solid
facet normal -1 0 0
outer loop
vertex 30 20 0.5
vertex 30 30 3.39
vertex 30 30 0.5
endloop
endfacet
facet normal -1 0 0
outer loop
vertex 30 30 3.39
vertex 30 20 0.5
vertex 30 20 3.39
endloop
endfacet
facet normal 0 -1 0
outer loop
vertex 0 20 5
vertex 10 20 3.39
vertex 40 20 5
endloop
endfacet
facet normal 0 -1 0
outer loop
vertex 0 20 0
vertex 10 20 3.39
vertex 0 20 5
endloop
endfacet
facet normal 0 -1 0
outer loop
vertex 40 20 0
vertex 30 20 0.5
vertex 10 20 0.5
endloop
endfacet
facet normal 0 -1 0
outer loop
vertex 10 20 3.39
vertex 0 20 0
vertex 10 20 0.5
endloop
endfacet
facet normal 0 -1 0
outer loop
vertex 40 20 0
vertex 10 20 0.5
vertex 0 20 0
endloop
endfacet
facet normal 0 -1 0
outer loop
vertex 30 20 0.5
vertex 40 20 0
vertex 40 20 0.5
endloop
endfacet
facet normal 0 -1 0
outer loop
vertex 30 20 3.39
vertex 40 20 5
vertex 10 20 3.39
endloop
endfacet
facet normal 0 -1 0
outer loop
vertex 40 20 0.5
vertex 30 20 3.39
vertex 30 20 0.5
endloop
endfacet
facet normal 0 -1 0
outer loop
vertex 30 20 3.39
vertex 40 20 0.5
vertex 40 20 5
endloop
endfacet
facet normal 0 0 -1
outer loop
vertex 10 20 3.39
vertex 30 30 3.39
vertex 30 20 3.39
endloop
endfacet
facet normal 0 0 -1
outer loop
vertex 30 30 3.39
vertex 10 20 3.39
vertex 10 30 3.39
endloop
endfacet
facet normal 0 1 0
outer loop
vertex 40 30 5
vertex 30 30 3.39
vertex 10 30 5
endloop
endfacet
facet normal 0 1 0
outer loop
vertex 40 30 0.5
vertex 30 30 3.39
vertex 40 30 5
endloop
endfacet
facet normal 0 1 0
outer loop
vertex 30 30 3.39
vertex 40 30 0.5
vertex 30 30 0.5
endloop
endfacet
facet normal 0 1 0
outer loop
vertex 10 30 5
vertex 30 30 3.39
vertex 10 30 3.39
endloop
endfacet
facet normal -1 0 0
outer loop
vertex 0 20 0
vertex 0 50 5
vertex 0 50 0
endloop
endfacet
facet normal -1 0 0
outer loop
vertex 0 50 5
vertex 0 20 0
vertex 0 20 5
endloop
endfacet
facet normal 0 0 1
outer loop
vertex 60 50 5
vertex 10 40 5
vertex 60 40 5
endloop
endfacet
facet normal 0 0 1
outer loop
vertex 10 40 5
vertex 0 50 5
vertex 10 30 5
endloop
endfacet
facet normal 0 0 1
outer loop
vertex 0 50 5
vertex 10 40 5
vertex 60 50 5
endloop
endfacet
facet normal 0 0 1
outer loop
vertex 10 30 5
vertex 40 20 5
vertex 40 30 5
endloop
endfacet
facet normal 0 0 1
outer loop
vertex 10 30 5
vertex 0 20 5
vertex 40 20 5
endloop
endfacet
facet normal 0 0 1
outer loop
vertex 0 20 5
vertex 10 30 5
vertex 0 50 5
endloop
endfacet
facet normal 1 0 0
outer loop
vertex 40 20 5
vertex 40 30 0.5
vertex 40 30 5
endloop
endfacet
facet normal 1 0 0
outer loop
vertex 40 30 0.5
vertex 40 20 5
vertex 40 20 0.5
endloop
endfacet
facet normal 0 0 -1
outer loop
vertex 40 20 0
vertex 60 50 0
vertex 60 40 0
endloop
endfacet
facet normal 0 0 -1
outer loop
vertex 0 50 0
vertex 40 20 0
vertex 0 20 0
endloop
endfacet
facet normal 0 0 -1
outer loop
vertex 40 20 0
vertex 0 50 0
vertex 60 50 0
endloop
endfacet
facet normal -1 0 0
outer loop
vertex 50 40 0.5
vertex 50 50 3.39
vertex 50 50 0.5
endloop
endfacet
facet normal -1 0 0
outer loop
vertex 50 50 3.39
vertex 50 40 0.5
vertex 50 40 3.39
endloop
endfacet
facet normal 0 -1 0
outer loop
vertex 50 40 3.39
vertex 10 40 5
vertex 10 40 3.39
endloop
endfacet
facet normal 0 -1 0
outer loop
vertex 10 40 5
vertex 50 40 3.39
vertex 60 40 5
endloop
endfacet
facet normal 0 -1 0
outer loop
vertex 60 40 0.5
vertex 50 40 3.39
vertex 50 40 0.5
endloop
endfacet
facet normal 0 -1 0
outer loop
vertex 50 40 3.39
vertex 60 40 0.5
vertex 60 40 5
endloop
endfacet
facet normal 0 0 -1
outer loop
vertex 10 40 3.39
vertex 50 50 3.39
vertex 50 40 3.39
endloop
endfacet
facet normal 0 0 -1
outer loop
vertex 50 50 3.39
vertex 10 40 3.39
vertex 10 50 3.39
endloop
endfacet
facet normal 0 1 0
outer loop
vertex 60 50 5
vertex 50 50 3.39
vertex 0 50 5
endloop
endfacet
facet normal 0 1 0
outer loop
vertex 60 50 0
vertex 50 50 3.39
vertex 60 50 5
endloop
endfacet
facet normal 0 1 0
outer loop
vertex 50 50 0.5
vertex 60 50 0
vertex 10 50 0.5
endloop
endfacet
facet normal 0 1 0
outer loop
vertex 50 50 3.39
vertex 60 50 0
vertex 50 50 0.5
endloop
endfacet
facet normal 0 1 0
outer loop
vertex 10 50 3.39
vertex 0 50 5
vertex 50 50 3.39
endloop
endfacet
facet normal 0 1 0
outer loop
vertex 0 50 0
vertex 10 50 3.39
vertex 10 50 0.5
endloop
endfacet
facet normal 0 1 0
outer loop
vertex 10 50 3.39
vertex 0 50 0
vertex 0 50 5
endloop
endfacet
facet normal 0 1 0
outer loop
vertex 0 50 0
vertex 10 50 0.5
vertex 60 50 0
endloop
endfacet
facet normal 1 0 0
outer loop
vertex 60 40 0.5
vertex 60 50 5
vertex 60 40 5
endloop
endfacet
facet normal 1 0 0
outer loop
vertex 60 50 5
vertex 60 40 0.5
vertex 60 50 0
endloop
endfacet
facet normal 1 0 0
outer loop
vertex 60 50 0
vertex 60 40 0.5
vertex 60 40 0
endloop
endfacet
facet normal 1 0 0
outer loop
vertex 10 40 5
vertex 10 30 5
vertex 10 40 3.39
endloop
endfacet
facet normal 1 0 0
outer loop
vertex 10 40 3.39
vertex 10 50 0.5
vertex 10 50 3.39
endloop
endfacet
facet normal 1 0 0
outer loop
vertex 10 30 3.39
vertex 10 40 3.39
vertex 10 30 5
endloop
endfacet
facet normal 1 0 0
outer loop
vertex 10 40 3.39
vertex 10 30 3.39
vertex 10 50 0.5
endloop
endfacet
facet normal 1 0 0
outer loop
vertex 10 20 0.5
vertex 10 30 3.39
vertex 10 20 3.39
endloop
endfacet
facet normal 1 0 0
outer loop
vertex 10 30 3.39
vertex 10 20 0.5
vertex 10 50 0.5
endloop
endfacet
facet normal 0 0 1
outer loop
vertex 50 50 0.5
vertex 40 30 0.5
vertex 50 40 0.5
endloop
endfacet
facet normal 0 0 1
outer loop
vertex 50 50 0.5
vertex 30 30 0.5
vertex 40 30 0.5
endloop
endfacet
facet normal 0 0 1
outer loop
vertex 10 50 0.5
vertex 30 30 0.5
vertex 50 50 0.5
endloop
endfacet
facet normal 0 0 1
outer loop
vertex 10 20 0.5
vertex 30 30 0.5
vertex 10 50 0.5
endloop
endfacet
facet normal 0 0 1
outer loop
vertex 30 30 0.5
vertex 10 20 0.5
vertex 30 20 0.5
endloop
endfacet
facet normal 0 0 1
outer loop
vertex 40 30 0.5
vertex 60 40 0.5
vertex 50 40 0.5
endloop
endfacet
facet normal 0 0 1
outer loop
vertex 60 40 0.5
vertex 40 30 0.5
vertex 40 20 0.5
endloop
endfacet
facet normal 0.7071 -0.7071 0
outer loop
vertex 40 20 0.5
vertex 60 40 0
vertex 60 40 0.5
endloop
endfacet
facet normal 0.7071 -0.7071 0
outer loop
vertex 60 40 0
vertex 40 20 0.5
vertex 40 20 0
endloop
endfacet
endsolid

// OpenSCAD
$fn=100;

bridge_length = 40;
bridge_angle = 0;
bridge_width = 6;

bridge_recovery_layers = 5;

layer_height = 0.32;
extrusion_width = 0.88;
height=3;
solid_strut=1;
foot_border=4;
strut_length=15;
top_cylinder=0;

bridge2();


/**********************************/
module bridge2(){
    min=20;
    max=40;
    base=0.5;
    p=10;
    h=5;
    bh=layer_height * bridge_recovery_layers + 0.01;
    // poles
    hull(){
        translate([0,min,0])
        cube([p,p,h]);

        translate([0,max,0])
        cube([p,p,h]);
    }
    
    hull(){
        translate([0,min,0])
        cube([p,p,base]);

        translate([0,max,0])
        cube([p,p,base]);

        translate([min+p*2-1,min,0])
        cube([1,p,base]);

        translate([max+p*2-1,max,0])
        cube([1,p,base]);
    }
    /**/
    // bridges
    for( i = [min:p*2:max]){
        hull(){
            translate([0,i,h-bh])
            cube([p,p,bh]);

            translate([i,i,h-bh])
            cube([p,p,bh]);
        }
        // pole
        translate([i+p,i,0])
        cube([p,p,h]);
    }
}    

module foot() {
    b= foot_border;
    e=height*cos(45);
    translate([-b-e,-b-e,0])
    cube([strut_length+b*2+e*2, bridge_width+b*2+e*2, layer_height]);
}

module strut() {
    e=height*cos(45);
	difference() {
        hull(){
            translate([-e,-e,0])
            cube([strut_length+e*2, bridge_width+e*2, .1]);

            translate([0,0,height])
            cube([strut_length, bridge_width, .1]);
        }

        if (solid_strut == 0){
            translate([0, 0, -1])
            cylinder(r1=(bridge_width / 1.5 - extrusion_width * 2) / cos(45), r2=(bridge_width / 2 - extrusion_width * 2) / cos(45), h=10, $fn=4);
        }
	}
}

module bridge1(){
    rotate(bridge_angle) {
        // Feet
        translate([0, 0, 0]) foot();
        translate([bridge_length + strut_length, 0, 0]) foot();

        // Structures
        translate([0, 0, 0]) strut();
        translate([bridge_length + strut_length, 0, 0]) strut();

        // Bridge
        translate([0, 0, height]) 
        cube([bridge_length + strut_length*2, bridge_width, layer_height * bridge_recovery_layers]);

        // Top cylinder
        if(top_cylinder == 1){
            translate([bridge_length / 2 + strut_length, bridge_width/2, height + layer_height * bridge_recovery_layers])
            difference() {
                cylinder(r=bridge_width / 2, h=bridge_width/3);
                cylinder(r=bridge_width / 2 - extrusion_width, h=5);
            }
        }
    }
}
